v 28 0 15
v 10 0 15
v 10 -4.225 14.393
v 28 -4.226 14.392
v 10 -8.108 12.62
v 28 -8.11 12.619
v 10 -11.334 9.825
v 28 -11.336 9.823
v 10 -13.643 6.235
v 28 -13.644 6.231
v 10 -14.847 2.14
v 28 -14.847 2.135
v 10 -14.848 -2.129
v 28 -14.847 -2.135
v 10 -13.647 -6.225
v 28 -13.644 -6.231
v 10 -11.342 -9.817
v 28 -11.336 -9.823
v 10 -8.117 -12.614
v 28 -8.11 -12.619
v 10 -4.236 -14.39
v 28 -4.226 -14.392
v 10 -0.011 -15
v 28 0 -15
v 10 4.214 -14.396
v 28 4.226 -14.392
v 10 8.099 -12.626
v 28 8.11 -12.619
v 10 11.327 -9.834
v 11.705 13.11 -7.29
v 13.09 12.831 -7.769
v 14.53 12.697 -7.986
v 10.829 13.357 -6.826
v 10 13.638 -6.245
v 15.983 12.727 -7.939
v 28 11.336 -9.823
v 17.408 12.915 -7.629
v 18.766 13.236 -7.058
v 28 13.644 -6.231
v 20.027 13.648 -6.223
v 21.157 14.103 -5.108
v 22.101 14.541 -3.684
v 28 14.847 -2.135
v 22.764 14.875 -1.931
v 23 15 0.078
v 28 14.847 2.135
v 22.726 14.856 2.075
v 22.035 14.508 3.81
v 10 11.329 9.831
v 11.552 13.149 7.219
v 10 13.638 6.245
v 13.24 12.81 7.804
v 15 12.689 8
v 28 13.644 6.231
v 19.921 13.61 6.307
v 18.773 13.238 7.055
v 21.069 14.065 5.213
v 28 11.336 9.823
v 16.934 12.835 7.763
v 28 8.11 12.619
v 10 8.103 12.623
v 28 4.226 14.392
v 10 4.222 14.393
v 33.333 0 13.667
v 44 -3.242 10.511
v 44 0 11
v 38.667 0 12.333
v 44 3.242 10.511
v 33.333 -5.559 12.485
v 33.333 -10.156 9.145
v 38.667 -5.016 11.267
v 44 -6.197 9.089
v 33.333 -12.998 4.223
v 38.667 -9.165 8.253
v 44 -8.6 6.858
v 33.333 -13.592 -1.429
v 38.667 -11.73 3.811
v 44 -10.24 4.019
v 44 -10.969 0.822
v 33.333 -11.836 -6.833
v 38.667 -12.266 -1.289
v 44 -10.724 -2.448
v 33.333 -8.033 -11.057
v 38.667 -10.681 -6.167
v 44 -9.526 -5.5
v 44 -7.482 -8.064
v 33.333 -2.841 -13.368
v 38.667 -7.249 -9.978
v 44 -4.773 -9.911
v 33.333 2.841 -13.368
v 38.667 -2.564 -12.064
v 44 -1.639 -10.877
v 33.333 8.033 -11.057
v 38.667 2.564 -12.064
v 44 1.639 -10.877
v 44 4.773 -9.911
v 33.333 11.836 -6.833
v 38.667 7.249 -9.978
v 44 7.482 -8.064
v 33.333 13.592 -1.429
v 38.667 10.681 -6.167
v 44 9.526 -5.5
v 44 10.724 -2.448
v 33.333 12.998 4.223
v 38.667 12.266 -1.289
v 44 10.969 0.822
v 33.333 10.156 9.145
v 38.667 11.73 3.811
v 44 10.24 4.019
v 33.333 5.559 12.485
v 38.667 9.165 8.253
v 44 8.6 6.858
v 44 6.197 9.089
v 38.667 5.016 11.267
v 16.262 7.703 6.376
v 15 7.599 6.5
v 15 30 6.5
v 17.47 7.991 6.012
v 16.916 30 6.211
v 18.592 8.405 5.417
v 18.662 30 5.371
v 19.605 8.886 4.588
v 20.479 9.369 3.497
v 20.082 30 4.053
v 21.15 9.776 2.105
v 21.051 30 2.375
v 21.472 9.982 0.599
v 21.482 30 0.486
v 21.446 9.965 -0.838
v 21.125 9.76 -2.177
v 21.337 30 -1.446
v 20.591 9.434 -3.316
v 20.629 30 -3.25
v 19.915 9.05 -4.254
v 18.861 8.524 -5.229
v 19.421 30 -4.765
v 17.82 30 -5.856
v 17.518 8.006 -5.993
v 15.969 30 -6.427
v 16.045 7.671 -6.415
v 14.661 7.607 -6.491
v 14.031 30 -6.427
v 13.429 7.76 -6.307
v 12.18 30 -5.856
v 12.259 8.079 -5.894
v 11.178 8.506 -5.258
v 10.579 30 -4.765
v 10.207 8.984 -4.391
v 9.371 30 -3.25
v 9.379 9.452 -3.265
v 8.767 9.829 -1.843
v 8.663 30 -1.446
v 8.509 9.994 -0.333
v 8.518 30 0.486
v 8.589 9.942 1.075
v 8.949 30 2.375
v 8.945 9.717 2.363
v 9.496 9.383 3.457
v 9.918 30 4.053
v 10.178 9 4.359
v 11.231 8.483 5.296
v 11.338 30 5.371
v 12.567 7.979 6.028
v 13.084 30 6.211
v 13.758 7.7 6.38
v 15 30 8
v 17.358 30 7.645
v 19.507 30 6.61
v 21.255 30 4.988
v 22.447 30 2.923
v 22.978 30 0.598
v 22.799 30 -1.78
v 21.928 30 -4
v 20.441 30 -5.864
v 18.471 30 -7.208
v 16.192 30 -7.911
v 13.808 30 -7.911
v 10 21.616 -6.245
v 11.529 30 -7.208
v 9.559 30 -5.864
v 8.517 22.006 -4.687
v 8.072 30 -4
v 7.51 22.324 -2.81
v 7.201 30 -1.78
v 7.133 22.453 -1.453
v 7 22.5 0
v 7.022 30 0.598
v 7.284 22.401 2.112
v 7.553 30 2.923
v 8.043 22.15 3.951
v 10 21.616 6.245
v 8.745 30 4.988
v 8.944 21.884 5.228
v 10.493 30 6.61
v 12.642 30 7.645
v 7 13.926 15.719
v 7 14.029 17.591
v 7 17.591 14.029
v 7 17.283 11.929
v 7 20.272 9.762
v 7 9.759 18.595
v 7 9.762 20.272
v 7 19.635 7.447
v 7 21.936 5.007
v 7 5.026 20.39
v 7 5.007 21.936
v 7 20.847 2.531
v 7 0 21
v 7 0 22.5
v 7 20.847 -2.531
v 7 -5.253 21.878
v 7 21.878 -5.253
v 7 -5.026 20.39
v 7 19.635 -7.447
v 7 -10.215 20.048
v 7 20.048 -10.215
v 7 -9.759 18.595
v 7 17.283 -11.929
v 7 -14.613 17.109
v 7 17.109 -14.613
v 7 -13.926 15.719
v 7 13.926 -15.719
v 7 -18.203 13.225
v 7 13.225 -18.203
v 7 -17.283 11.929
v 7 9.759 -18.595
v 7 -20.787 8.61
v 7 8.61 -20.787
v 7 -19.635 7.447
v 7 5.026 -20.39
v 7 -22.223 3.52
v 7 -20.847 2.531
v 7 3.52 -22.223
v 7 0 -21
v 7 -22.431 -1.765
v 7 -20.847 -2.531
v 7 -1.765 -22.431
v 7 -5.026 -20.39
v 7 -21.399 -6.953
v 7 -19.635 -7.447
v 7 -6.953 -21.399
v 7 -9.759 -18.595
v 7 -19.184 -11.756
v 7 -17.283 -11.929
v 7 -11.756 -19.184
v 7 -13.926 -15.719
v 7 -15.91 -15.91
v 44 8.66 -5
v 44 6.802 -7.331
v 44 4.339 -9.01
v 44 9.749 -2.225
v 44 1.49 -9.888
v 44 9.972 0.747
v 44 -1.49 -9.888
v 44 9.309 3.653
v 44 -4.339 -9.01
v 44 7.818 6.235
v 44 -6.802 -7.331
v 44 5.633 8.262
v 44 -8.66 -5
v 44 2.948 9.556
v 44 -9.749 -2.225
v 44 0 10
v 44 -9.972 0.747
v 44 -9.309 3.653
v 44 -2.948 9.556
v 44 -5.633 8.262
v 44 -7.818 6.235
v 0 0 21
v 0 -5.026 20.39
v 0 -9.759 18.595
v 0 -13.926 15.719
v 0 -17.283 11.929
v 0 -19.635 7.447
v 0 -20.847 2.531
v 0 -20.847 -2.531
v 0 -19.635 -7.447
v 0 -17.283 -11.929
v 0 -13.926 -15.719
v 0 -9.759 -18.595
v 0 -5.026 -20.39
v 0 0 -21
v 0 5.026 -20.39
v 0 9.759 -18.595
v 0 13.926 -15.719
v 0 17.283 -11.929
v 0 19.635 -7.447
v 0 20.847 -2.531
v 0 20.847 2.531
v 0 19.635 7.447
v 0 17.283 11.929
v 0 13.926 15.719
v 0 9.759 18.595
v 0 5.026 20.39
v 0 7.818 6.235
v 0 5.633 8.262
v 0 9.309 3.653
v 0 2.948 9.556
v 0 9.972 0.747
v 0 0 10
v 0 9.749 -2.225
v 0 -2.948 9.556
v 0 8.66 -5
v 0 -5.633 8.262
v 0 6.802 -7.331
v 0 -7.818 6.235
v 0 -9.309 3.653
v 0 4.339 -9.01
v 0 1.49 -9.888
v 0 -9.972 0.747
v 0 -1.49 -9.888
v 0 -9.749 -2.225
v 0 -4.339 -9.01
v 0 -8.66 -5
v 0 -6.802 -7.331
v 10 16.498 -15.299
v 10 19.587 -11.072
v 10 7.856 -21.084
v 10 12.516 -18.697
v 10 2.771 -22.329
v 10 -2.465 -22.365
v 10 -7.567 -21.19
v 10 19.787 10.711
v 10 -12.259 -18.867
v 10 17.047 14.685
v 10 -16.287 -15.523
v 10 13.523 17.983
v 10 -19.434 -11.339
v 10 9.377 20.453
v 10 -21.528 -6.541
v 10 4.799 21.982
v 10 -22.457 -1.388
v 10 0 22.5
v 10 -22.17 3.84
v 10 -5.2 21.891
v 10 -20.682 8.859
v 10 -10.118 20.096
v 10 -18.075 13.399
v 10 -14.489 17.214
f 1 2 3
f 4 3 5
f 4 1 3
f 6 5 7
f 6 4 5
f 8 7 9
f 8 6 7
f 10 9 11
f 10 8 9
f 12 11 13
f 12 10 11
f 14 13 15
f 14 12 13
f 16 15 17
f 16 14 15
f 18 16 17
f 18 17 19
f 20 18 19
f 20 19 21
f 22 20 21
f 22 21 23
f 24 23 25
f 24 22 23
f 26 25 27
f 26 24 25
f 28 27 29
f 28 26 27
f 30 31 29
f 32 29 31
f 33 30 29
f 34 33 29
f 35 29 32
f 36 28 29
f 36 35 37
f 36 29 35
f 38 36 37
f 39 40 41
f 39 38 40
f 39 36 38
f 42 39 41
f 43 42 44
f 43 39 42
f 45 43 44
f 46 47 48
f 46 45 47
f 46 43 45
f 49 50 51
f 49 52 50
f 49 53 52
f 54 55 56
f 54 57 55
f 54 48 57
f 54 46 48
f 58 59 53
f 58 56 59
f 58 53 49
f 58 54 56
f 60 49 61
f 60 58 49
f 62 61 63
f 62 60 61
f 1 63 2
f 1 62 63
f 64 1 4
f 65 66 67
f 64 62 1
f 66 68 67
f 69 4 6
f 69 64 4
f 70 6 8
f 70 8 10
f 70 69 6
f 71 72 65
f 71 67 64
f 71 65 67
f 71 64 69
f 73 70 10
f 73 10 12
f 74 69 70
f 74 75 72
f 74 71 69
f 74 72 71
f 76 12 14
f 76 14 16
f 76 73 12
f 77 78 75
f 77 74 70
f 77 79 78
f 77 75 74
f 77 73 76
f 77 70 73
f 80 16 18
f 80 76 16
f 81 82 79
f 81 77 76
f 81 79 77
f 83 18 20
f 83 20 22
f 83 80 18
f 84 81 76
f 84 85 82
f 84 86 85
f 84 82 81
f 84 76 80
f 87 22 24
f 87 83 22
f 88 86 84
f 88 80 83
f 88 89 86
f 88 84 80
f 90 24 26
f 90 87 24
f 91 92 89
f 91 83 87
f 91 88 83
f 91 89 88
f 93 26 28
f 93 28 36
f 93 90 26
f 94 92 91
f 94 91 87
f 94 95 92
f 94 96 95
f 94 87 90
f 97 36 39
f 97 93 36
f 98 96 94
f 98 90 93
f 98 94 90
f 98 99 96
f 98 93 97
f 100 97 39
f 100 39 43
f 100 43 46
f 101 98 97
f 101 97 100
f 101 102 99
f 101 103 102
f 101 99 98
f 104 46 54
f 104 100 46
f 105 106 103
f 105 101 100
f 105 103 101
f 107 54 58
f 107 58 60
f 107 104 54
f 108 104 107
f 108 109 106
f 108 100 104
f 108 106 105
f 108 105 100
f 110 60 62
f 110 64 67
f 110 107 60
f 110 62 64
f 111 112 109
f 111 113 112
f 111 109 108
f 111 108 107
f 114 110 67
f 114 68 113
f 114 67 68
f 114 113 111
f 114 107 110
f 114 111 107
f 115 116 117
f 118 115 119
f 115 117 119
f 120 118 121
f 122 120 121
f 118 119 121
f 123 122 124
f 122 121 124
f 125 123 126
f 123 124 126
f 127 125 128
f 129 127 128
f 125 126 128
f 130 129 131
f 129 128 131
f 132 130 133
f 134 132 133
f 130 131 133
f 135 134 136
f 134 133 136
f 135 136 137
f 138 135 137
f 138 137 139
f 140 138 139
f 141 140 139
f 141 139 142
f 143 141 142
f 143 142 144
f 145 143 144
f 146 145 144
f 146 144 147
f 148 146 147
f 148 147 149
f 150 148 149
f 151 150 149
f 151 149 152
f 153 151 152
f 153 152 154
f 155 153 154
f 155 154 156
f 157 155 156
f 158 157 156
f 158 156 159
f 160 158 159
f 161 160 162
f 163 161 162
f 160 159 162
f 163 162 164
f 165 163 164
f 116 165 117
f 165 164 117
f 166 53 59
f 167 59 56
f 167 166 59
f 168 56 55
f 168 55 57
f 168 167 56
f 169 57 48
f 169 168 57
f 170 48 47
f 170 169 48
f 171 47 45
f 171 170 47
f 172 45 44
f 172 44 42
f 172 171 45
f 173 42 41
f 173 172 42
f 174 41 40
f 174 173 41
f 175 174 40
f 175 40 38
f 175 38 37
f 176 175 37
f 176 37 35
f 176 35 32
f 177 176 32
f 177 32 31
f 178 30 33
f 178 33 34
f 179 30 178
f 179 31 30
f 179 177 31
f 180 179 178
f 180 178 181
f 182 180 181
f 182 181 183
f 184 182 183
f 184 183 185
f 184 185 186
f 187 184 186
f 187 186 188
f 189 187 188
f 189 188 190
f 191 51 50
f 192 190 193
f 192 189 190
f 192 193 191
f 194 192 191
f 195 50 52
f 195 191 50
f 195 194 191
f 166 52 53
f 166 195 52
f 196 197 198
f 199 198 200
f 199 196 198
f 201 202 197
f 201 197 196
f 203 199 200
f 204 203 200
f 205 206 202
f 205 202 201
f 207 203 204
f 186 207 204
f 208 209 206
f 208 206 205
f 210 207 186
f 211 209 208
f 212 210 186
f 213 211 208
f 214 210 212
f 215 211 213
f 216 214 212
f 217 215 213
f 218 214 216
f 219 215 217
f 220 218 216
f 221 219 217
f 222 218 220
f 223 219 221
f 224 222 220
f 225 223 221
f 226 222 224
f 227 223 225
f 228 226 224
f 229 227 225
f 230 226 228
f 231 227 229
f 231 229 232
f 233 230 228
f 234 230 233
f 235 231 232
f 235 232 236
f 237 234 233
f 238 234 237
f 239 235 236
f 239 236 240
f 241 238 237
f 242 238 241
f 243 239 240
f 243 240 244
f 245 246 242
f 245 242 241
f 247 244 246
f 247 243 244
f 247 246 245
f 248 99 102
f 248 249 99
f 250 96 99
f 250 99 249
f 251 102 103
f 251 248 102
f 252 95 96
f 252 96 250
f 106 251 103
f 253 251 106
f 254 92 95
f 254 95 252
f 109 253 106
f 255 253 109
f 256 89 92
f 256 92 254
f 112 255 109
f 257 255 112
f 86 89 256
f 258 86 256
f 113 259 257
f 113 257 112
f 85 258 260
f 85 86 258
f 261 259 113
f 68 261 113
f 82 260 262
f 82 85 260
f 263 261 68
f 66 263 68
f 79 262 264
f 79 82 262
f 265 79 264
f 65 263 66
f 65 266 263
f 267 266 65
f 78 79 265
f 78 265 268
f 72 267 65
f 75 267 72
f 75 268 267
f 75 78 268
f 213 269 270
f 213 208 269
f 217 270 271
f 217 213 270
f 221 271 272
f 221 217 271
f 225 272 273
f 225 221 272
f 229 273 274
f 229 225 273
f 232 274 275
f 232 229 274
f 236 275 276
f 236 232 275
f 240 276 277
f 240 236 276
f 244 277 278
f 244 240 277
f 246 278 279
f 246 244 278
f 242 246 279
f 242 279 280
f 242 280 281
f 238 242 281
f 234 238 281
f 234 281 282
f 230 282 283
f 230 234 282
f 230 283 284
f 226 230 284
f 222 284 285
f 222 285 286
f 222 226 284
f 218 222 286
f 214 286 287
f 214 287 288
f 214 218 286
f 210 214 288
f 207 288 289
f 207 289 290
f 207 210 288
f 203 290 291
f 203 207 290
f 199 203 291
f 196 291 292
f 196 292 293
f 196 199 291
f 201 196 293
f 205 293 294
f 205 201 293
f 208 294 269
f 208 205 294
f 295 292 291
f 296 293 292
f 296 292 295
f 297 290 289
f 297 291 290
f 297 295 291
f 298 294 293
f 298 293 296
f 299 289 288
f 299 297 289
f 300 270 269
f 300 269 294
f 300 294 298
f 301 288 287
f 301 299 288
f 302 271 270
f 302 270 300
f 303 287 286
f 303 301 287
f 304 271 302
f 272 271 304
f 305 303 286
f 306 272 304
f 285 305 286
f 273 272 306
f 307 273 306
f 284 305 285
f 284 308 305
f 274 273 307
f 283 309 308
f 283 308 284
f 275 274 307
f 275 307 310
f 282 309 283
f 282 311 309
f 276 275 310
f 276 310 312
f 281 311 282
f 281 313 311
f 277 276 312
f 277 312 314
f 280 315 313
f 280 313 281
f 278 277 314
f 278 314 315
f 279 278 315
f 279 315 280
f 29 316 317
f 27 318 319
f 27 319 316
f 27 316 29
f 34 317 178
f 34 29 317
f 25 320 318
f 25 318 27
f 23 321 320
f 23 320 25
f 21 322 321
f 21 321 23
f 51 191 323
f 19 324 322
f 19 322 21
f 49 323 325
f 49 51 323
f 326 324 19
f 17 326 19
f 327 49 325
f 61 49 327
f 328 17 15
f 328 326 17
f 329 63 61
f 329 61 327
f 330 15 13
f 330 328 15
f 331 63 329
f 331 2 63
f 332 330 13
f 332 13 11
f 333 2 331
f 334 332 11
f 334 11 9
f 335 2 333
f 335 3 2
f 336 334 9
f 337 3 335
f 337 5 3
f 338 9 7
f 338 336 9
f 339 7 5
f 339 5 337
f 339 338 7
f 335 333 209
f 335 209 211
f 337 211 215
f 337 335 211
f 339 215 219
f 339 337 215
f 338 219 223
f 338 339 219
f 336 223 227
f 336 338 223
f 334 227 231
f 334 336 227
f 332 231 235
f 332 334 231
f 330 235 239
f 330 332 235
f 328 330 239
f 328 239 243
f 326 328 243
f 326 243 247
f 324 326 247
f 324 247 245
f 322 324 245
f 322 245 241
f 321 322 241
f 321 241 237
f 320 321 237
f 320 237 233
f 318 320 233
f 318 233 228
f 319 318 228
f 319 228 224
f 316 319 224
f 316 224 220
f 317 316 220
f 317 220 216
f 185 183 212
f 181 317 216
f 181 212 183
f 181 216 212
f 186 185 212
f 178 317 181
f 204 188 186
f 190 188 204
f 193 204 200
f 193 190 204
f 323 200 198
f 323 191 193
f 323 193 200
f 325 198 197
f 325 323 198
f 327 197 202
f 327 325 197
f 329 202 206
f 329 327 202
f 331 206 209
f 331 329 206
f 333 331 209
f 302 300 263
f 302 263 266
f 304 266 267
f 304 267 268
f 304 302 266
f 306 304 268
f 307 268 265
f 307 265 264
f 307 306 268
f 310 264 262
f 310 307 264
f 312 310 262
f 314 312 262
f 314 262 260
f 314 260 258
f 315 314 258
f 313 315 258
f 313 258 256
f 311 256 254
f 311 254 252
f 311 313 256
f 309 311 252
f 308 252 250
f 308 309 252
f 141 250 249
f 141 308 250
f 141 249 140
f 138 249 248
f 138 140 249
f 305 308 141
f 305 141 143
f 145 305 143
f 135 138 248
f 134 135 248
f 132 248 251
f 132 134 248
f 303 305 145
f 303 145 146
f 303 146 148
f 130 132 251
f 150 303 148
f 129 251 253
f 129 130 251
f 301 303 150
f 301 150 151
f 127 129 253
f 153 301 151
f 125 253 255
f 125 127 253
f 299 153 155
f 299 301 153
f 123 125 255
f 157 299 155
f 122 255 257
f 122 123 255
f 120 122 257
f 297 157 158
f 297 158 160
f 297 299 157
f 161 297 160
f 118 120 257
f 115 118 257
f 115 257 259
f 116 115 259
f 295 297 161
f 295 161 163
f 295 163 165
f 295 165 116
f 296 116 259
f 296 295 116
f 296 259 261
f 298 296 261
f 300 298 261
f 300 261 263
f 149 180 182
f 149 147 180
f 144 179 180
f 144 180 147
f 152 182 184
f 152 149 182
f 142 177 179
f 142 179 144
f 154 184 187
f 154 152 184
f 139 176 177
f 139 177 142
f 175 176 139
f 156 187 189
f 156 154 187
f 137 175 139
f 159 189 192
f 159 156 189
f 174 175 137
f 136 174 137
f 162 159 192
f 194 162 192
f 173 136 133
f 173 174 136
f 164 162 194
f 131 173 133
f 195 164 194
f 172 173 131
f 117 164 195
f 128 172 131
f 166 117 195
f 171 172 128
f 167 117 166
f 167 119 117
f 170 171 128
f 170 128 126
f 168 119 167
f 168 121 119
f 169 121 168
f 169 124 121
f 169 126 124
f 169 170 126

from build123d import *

# Parameters (mm, degrees)
BOSS_EXTRU_1_REACH           = 74.101
ESQUISSE2_R                  = 8
ENL_V_MAT_EXTRU_1_REACH      = 74.101
ENL_V_MAT_EXTRU_1_END_RADIUS = 10
ESQUISSE3_R                  = 6.5


with BuildPart() as part:
    # Esquisse1 → Révolution1 (revolve)
    with BuildSketch(Plane.XY, mode=Mode.PRIVATE) as r_volution1_sk:
        Polygon((44, 10), (0, 10), (0, 21), (7, 21), (7, 22.5), (10, 22.5), (10, 15), (28, 15), (44, 11), align=None)
    revolve(r_volution1_sk.sketch.rotate(Axis((0, 0, 0), (1, 0, 0)), 90), axis=Axis((0, 0, 0), (1, 0, 0)))

    # Esquisse2 → Boss.-Extru.1 (add, up to next)
    with BuildSketch(Plane(origin=(0, 30, 0), x_dir=(1, 0, 0), z_dir=(0, 1, 0)), mode=Mode.PRIVATE) as boss_extru_1_sk1:
        with Locations(Location((15, 0, 0), (0, 0, 270))):
            Circle(ESQUISSE2_R)
    boss_extru_1_tool1 = extrude(boss_extru_1_sk1.sketch, amount=-BOSS_EXTRU_1_REACH, mode=Mode.PRIVATE) - part.part
    add(boss_extru_1_tool1.solids().sort_by_distance((15, 30, 0))[0])

    # Enlèv. mat.-Extru.1: up to this cylinder (the profile starts outside it)
    enl_v_mat_extru_1_end = Plane(origin=(15, 0, 0), z_dir=(-1, 0, 0)) * Cylinder(ENL_V_MAT_EXTRU_1_END_RADIUS, 169.202, mode=Mode.PRIVATE)
    # Esquisse3 → Enlèv. mat.-Extru.1 (cut, up to the surface)
    with BuildSketch(Plane(origin=(0, 30, 0), x_dir=(1, 0, 0), z_dir=(0, 1, 0)), mode=Mode.PRIVATE) as enl_v_mat_extru_1_sk1:
        with Locations(Location((15, 0, 0), (0, 0, 270))):
            Circle(ESQUISSE3_R)
    enl_v_mat_extru_1_tool1 = extrude(enl_v_mat_extru_1_sk1.sketch, amount=-ENL_V_MAT_EXTRU_1_REACH, mode=Mode.PRIVATE) - enl_v_mat_extru_1_end
    add(enl_v_mat_extru_1_tool1.solids().sort_by_distance((15, 30, 0))[0], mode=Mode.SUBTRACT)


solid = part.part
